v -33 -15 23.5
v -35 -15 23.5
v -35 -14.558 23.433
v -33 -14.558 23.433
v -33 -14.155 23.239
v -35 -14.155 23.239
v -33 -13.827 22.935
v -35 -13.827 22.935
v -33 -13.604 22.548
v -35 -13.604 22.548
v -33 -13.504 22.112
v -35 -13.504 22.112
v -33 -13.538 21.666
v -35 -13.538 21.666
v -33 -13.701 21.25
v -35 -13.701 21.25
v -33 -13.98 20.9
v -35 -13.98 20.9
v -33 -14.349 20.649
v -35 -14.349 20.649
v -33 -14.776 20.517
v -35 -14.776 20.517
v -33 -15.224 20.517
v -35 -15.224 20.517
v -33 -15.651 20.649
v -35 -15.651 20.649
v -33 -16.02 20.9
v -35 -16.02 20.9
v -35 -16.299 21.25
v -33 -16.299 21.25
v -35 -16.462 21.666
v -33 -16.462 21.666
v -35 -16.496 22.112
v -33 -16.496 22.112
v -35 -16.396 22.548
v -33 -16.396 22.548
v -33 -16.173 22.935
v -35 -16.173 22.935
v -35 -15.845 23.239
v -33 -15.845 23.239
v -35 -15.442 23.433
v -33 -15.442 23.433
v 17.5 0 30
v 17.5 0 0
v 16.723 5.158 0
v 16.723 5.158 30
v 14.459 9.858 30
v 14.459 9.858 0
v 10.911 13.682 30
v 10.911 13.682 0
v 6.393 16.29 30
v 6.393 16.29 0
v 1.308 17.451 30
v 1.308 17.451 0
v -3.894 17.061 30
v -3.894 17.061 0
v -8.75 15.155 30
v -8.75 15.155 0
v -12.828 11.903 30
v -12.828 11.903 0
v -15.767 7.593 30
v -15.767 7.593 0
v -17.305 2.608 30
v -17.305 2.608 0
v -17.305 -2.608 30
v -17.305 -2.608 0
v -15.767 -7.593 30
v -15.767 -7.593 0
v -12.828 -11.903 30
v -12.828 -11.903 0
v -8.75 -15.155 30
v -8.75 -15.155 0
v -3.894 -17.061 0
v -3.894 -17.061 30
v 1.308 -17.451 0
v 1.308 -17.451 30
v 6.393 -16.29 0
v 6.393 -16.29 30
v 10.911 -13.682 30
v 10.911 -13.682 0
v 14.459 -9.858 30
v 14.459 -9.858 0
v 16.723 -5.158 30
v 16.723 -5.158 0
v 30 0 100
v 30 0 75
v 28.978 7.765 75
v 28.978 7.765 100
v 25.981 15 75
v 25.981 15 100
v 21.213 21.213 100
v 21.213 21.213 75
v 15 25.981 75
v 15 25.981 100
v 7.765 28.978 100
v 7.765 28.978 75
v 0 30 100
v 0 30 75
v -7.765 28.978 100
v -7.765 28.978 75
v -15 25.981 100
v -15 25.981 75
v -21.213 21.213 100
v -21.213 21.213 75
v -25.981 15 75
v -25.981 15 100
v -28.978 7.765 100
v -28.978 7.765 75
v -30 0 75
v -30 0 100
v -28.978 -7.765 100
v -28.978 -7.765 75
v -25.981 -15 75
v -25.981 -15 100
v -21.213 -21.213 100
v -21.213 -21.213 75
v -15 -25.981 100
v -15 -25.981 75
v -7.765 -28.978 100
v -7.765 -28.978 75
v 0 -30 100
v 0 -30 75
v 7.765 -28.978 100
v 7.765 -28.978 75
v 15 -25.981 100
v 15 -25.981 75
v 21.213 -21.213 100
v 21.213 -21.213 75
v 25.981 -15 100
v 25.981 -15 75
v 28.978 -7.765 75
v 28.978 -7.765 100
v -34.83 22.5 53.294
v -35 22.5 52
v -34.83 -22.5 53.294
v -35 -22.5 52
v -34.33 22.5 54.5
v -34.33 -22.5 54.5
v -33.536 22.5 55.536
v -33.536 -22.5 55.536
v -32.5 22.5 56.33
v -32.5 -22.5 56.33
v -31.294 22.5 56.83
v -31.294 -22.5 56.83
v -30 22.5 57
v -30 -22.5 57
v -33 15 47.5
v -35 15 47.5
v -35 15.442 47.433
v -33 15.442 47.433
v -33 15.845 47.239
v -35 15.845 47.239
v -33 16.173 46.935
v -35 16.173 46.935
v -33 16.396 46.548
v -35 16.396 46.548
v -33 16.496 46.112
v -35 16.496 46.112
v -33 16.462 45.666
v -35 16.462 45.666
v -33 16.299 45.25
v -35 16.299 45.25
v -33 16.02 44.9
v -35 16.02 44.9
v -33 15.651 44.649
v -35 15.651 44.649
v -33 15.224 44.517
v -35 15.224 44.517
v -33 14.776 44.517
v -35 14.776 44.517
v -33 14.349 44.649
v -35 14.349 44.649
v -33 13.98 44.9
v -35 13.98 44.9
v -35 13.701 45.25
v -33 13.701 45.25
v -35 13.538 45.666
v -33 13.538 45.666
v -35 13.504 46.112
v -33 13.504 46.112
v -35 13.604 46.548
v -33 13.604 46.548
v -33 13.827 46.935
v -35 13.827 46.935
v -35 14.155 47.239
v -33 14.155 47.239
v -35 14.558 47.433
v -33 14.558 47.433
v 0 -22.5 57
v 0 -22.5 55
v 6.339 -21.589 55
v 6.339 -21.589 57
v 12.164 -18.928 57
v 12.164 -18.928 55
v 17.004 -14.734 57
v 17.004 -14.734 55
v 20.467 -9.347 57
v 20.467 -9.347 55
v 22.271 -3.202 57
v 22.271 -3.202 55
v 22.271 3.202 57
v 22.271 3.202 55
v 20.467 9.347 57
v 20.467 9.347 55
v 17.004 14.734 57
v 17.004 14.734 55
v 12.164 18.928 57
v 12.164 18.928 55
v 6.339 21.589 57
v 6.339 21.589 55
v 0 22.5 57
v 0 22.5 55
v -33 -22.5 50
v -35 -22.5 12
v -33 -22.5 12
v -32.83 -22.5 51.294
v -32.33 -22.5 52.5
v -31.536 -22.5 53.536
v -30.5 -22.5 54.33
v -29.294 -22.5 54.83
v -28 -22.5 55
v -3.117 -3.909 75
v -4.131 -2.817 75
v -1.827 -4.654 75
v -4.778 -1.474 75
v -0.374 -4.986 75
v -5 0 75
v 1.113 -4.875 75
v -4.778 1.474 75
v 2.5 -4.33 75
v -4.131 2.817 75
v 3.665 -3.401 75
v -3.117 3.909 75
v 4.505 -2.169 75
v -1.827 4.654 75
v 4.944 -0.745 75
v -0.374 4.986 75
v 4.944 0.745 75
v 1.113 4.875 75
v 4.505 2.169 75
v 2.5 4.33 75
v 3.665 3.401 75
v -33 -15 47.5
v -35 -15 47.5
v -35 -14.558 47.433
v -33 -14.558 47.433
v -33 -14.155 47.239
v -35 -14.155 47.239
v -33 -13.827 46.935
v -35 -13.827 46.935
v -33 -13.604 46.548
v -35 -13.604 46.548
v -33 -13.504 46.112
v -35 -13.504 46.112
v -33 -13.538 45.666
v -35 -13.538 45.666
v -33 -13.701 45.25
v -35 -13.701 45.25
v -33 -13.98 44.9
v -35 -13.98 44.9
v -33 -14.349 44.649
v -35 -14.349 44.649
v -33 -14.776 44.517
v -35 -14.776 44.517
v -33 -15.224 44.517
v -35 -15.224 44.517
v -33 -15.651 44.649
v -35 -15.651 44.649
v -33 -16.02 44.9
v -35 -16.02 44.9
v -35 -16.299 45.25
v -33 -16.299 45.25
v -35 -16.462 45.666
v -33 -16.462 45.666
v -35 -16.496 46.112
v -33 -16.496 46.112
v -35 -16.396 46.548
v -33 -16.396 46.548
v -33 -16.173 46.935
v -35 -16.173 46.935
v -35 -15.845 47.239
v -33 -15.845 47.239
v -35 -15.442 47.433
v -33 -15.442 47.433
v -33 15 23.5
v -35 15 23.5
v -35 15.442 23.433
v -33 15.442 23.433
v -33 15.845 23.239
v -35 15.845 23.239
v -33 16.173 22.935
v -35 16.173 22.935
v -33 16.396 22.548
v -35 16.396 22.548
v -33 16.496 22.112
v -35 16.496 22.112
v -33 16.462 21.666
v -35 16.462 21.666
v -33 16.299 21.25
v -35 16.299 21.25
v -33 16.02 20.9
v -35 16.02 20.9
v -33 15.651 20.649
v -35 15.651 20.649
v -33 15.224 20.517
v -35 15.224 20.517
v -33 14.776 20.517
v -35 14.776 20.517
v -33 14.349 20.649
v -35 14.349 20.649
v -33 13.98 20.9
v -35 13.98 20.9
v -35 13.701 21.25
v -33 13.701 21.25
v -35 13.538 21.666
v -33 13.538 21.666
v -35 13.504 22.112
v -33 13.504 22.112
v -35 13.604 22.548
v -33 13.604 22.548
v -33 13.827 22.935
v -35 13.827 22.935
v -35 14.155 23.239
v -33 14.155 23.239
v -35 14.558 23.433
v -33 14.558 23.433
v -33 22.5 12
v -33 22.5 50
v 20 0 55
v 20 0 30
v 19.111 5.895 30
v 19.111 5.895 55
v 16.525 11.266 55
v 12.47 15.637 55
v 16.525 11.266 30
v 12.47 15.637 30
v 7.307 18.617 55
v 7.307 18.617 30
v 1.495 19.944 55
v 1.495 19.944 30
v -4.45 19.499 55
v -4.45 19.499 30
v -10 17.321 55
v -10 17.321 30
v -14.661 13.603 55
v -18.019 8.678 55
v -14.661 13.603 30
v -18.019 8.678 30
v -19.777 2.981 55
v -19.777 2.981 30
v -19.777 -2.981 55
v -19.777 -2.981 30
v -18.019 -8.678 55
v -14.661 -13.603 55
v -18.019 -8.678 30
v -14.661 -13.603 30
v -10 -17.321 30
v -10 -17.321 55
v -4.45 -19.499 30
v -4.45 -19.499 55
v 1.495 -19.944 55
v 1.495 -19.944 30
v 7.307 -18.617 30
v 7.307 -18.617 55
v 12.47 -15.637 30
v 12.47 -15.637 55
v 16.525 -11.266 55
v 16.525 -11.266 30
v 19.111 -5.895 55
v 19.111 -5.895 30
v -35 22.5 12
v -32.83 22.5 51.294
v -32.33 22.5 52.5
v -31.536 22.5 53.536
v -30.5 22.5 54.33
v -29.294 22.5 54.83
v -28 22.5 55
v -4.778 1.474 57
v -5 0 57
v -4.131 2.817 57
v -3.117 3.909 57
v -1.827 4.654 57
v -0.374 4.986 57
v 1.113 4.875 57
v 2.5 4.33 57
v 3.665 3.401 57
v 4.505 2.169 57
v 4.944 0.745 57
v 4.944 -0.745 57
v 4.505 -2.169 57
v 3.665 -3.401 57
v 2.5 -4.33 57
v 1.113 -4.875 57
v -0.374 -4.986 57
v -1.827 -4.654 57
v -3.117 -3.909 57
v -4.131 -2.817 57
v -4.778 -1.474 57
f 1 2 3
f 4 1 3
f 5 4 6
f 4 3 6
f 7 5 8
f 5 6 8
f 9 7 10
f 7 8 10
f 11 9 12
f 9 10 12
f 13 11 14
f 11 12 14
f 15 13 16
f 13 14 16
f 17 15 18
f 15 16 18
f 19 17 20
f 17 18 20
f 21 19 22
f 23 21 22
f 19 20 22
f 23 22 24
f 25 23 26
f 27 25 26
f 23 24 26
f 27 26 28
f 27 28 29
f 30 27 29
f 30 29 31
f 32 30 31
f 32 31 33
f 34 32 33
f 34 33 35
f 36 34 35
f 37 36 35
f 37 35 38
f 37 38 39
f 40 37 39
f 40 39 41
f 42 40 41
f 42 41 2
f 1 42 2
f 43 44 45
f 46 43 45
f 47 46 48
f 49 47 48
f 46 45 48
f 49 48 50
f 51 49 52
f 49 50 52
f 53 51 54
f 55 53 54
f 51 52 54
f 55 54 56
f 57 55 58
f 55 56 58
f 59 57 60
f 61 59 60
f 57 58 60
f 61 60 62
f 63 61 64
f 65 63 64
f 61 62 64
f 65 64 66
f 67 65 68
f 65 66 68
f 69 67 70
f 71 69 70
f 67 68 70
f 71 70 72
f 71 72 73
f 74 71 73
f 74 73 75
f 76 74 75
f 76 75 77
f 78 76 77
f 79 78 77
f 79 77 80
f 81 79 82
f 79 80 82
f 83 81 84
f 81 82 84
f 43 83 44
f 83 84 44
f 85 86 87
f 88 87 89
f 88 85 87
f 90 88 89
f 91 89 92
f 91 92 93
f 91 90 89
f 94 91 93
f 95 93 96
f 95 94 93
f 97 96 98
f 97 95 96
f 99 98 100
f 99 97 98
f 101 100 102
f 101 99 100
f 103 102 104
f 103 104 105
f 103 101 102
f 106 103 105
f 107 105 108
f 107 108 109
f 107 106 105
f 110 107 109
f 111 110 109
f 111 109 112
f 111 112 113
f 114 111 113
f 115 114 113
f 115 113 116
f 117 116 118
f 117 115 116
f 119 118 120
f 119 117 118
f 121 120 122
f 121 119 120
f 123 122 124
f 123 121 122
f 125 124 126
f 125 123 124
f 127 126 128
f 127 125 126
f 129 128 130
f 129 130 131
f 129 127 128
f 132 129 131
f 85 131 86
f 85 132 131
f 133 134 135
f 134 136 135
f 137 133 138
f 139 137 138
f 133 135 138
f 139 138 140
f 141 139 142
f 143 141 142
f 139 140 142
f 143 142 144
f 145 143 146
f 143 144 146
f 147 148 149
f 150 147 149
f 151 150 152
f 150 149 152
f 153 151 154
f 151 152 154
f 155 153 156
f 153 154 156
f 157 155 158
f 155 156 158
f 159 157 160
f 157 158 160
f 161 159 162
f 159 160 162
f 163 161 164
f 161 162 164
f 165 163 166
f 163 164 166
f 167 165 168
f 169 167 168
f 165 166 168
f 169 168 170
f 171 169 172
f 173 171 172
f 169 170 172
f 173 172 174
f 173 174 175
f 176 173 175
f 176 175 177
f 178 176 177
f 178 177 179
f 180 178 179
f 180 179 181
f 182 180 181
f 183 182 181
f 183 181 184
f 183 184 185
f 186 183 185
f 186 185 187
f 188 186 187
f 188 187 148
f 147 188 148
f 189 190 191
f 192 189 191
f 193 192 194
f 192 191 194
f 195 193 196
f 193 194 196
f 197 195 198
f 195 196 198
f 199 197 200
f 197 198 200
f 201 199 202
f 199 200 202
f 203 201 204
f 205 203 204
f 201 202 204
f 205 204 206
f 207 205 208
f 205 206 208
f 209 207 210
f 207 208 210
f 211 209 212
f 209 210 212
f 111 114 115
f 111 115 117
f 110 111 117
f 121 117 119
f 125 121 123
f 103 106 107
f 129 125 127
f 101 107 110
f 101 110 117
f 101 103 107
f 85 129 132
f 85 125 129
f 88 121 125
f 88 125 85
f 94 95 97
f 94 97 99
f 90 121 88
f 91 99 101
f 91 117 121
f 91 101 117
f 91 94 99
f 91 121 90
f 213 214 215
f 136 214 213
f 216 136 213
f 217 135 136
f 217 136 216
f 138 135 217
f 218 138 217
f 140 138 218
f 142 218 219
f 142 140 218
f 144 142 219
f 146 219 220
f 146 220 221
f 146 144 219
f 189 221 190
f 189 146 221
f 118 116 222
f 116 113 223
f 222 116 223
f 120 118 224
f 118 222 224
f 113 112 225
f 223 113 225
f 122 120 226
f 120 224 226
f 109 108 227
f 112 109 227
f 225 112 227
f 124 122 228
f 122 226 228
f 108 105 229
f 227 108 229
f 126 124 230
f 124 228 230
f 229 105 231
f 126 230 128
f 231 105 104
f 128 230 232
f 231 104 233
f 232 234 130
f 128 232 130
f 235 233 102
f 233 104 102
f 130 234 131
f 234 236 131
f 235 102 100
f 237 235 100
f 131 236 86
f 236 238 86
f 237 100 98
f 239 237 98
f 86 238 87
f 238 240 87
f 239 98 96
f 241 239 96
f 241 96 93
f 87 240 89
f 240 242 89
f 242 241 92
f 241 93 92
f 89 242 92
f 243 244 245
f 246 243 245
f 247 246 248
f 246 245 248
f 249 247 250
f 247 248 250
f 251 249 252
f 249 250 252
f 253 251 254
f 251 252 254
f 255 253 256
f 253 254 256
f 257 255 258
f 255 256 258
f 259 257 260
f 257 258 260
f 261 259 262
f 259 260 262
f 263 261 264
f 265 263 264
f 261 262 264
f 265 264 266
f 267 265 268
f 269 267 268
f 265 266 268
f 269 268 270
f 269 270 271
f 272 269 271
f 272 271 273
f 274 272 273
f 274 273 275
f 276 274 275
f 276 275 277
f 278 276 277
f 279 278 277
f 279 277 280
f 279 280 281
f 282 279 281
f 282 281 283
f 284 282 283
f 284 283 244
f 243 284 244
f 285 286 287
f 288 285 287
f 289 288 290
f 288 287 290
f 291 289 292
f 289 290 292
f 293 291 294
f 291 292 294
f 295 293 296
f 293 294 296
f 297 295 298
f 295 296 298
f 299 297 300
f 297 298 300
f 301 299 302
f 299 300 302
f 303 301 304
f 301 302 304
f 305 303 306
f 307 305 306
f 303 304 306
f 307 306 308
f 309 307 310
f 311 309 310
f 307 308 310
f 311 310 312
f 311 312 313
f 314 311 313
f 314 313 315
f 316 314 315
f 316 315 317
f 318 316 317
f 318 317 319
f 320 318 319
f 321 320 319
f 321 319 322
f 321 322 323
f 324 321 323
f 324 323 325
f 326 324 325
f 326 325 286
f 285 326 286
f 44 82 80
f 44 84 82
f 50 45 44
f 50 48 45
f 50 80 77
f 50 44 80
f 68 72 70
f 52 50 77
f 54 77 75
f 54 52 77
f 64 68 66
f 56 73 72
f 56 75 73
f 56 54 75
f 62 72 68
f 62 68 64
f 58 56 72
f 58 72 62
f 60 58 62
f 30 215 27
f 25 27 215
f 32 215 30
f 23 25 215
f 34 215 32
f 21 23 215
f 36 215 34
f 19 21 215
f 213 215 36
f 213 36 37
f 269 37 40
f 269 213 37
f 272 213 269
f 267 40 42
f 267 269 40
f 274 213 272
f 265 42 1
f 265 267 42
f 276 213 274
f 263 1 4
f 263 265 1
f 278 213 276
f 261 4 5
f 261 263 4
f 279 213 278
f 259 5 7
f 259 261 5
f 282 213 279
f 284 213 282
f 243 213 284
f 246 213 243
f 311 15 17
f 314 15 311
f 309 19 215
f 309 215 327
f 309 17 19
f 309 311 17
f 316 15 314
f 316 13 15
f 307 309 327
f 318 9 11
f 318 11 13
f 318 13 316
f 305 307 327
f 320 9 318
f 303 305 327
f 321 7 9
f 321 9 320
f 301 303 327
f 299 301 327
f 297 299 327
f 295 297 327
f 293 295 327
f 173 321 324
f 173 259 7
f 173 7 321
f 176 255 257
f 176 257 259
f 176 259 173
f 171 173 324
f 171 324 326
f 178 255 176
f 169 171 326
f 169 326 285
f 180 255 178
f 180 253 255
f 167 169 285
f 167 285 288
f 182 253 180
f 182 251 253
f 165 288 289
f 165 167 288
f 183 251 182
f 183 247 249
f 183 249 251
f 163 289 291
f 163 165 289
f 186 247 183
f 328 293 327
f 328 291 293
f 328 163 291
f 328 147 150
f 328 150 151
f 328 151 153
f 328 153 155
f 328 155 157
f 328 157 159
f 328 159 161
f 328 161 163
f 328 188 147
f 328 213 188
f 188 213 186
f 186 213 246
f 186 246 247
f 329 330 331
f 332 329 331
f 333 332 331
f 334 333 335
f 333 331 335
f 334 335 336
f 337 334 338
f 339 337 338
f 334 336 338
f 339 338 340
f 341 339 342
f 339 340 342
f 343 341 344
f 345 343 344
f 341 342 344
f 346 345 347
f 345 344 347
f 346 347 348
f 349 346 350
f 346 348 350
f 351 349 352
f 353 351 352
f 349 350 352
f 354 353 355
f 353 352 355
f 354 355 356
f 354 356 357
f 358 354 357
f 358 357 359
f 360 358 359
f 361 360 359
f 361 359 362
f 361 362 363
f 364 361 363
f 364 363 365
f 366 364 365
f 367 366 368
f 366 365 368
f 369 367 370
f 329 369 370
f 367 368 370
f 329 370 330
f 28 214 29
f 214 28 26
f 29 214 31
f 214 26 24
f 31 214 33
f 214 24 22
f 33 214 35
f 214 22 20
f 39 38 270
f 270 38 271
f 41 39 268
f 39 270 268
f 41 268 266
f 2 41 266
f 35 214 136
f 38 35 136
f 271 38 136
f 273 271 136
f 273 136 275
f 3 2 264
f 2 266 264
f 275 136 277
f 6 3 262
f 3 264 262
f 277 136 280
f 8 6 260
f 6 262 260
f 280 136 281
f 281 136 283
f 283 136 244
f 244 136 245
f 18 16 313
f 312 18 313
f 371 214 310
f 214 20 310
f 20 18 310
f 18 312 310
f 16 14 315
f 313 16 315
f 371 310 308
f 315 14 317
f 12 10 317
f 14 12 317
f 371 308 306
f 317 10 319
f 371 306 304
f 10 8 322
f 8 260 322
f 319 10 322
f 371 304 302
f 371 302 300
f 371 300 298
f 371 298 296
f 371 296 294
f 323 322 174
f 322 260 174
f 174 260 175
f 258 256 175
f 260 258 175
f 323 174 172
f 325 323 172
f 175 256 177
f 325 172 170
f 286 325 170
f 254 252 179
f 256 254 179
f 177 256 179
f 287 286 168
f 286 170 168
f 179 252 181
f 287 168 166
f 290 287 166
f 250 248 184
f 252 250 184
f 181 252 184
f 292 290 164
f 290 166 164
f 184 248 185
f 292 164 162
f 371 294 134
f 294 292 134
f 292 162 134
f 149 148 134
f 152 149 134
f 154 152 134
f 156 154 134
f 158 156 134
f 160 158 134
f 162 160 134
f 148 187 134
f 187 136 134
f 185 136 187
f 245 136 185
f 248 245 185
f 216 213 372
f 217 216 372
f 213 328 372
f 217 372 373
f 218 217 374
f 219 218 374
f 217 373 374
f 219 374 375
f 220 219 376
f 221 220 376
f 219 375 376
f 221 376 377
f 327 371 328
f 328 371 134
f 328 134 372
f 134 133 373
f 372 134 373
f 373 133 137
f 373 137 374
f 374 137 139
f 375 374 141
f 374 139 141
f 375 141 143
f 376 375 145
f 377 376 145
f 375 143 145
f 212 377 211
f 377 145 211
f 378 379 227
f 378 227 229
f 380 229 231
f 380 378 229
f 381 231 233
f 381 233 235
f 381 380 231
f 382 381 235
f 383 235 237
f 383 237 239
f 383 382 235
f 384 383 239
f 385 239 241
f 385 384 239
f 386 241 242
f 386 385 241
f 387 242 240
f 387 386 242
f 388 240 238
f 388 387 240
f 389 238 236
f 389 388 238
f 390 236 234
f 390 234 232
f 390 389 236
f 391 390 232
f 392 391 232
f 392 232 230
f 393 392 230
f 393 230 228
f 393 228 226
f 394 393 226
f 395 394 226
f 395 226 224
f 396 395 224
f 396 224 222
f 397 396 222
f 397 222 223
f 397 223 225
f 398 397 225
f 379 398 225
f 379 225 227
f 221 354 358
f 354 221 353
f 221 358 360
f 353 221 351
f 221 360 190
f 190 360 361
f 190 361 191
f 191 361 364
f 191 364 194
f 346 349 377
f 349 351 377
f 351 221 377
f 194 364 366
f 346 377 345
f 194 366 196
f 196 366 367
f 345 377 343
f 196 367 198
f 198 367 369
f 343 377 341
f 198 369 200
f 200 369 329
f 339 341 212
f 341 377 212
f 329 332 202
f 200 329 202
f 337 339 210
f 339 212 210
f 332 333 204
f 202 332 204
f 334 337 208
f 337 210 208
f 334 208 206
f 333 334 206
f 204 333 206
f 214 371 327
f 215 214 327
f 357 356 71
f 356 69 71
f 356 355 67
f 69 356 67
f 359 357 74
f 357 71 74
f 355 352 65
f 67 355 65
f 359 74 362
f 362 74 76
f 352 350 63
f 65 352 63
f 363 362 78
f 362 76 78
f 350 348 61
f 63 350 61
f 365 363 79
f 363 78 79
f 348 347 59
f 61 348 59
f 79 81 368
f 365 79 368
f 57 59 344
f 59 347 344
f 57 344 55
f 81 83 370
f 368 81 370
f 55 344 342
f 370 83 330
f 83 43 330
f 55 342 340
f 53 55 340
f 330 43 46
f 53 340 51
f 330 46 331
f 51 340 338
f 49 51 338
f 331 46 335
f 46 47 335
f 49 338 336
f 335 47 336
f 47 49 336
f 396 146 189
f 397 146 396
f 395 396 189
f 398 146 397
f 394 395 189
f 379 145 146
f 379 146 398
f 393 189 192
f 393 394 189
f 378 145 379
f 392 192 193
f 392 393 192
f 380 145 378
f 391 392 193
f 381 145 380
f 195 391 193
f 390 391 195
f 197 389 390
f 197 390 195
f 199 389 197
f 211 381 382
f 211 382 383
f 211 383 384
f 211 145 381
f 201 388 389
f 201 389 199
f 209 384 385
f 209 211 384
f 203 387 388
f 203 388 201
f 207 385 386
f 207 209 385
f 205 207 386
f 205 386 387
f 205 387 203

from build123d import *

# Parameters (mm, degrees)
SKETCH_1_R          = 17.5
EXTRUDE_1_DEPTH     = 30
SKETCH_2_R          = 20
EXTRUDE_2_DEPTH     = 25
SKETCH_3_R          = 5
EXTRUDE_3_DEPTH     = 100
SKETCH_4_R          = 30
EXTRUDE_4_DEPTH     = 25
EXTRUDE_5_DEPTH     = 2
SKETCH_7_W          = 2
SKETCH_7_H          = 45
EXTRUDE_6_DEPTH     = 45
FILLET_3_R          = 5
SKETCH_8_R          = 1.5
CUT_EXTRUDE_1_DEPTH = 5


with BuildPart() as part:
    # 草图1 → 凸台-拉伸1 (new body)
    with BuildSketch(Plane.XY):
        Circle(SKETCH_1_R)
    extrude(amount=EXTRUDE_1_DEPTH)

    # 草图2 → 凸台-拉伸2 (add)
    with BuildSketch(Plane.XY.offset(30)):
        Circle(SKETCH_2_R)
    extrude(amount=EXTRUDE_2_DEPTH)

    # 草图3 → 凸台-拉伸3 (add)
    with BuildSketch(Plane(origin=(0, 0, 0), x_dir=(-1, 0, 0), z_dir=(0, 0, -1))):
        Circle(SKETCH_3_R)
    extrude(amount=-EXTRUDE_3_DEPTH)

    # 草图4 → 凸台-拉伸4 (add)
    with BuildSketch(Plane.XY.offset(100)):
        Circle(SKETCH_4_R)
    extrude(amount=-EXTRUDE_4_DEPTH)

    # 草图6 → 凸台-拉伸5 (add)
    with BuildSketch(Plane.XY.offset(55)):
        with BuildLine():
            Line((0, 22.5), (-35, 22.5))
            Line((-35, 22.5), (-35, -22.5))
            Line((-35, -22.5), (0, -22.5))
            ThreePointArc((0, -22.5), (22.5, 0), (0, 22.5))
        make_face()
    extrude(amount=EXTRUDE_5_DEPTH)

    # 草图7 → 凸台-拉伸6 (add)
    with BuildSketch(Plane.XY.offset(57)):
        with Locations((-34, 0)):
            Rectangle(SKETCH_7_W, SKETCH_7_H)
    extrude(amount=-EXTRUDE_6_DEPTH)

    # 圆角3
    fillet_3_edges = [part.edges().sort_by_distance(p)[0] for p in [
        (-35, 0, 57),
        (-33, 0, 55),
    ]]
    fillet(fillet_3_edges, radius=FILLET_3_R)

    # 草图8 → 切除-拉伸1 (cut)
    with BuildSketch(Plane.ZY.offset(35)):
        with Locations((22, 15)):
            Circle(SKETCH_8_R)
        with Locations((22, -15)):
            Circle(SKETCH_8_R)
        with Locations((46, 15)):
            Circle(SKETCH_8_R)
        with Locations((46, -15)):
            Circle(SKETCH_8_R)
    extrude(amount=-CUT_EXTRUDE_1_DEPTH, mode=Mode.SUBTRACT)


solid = part.part
